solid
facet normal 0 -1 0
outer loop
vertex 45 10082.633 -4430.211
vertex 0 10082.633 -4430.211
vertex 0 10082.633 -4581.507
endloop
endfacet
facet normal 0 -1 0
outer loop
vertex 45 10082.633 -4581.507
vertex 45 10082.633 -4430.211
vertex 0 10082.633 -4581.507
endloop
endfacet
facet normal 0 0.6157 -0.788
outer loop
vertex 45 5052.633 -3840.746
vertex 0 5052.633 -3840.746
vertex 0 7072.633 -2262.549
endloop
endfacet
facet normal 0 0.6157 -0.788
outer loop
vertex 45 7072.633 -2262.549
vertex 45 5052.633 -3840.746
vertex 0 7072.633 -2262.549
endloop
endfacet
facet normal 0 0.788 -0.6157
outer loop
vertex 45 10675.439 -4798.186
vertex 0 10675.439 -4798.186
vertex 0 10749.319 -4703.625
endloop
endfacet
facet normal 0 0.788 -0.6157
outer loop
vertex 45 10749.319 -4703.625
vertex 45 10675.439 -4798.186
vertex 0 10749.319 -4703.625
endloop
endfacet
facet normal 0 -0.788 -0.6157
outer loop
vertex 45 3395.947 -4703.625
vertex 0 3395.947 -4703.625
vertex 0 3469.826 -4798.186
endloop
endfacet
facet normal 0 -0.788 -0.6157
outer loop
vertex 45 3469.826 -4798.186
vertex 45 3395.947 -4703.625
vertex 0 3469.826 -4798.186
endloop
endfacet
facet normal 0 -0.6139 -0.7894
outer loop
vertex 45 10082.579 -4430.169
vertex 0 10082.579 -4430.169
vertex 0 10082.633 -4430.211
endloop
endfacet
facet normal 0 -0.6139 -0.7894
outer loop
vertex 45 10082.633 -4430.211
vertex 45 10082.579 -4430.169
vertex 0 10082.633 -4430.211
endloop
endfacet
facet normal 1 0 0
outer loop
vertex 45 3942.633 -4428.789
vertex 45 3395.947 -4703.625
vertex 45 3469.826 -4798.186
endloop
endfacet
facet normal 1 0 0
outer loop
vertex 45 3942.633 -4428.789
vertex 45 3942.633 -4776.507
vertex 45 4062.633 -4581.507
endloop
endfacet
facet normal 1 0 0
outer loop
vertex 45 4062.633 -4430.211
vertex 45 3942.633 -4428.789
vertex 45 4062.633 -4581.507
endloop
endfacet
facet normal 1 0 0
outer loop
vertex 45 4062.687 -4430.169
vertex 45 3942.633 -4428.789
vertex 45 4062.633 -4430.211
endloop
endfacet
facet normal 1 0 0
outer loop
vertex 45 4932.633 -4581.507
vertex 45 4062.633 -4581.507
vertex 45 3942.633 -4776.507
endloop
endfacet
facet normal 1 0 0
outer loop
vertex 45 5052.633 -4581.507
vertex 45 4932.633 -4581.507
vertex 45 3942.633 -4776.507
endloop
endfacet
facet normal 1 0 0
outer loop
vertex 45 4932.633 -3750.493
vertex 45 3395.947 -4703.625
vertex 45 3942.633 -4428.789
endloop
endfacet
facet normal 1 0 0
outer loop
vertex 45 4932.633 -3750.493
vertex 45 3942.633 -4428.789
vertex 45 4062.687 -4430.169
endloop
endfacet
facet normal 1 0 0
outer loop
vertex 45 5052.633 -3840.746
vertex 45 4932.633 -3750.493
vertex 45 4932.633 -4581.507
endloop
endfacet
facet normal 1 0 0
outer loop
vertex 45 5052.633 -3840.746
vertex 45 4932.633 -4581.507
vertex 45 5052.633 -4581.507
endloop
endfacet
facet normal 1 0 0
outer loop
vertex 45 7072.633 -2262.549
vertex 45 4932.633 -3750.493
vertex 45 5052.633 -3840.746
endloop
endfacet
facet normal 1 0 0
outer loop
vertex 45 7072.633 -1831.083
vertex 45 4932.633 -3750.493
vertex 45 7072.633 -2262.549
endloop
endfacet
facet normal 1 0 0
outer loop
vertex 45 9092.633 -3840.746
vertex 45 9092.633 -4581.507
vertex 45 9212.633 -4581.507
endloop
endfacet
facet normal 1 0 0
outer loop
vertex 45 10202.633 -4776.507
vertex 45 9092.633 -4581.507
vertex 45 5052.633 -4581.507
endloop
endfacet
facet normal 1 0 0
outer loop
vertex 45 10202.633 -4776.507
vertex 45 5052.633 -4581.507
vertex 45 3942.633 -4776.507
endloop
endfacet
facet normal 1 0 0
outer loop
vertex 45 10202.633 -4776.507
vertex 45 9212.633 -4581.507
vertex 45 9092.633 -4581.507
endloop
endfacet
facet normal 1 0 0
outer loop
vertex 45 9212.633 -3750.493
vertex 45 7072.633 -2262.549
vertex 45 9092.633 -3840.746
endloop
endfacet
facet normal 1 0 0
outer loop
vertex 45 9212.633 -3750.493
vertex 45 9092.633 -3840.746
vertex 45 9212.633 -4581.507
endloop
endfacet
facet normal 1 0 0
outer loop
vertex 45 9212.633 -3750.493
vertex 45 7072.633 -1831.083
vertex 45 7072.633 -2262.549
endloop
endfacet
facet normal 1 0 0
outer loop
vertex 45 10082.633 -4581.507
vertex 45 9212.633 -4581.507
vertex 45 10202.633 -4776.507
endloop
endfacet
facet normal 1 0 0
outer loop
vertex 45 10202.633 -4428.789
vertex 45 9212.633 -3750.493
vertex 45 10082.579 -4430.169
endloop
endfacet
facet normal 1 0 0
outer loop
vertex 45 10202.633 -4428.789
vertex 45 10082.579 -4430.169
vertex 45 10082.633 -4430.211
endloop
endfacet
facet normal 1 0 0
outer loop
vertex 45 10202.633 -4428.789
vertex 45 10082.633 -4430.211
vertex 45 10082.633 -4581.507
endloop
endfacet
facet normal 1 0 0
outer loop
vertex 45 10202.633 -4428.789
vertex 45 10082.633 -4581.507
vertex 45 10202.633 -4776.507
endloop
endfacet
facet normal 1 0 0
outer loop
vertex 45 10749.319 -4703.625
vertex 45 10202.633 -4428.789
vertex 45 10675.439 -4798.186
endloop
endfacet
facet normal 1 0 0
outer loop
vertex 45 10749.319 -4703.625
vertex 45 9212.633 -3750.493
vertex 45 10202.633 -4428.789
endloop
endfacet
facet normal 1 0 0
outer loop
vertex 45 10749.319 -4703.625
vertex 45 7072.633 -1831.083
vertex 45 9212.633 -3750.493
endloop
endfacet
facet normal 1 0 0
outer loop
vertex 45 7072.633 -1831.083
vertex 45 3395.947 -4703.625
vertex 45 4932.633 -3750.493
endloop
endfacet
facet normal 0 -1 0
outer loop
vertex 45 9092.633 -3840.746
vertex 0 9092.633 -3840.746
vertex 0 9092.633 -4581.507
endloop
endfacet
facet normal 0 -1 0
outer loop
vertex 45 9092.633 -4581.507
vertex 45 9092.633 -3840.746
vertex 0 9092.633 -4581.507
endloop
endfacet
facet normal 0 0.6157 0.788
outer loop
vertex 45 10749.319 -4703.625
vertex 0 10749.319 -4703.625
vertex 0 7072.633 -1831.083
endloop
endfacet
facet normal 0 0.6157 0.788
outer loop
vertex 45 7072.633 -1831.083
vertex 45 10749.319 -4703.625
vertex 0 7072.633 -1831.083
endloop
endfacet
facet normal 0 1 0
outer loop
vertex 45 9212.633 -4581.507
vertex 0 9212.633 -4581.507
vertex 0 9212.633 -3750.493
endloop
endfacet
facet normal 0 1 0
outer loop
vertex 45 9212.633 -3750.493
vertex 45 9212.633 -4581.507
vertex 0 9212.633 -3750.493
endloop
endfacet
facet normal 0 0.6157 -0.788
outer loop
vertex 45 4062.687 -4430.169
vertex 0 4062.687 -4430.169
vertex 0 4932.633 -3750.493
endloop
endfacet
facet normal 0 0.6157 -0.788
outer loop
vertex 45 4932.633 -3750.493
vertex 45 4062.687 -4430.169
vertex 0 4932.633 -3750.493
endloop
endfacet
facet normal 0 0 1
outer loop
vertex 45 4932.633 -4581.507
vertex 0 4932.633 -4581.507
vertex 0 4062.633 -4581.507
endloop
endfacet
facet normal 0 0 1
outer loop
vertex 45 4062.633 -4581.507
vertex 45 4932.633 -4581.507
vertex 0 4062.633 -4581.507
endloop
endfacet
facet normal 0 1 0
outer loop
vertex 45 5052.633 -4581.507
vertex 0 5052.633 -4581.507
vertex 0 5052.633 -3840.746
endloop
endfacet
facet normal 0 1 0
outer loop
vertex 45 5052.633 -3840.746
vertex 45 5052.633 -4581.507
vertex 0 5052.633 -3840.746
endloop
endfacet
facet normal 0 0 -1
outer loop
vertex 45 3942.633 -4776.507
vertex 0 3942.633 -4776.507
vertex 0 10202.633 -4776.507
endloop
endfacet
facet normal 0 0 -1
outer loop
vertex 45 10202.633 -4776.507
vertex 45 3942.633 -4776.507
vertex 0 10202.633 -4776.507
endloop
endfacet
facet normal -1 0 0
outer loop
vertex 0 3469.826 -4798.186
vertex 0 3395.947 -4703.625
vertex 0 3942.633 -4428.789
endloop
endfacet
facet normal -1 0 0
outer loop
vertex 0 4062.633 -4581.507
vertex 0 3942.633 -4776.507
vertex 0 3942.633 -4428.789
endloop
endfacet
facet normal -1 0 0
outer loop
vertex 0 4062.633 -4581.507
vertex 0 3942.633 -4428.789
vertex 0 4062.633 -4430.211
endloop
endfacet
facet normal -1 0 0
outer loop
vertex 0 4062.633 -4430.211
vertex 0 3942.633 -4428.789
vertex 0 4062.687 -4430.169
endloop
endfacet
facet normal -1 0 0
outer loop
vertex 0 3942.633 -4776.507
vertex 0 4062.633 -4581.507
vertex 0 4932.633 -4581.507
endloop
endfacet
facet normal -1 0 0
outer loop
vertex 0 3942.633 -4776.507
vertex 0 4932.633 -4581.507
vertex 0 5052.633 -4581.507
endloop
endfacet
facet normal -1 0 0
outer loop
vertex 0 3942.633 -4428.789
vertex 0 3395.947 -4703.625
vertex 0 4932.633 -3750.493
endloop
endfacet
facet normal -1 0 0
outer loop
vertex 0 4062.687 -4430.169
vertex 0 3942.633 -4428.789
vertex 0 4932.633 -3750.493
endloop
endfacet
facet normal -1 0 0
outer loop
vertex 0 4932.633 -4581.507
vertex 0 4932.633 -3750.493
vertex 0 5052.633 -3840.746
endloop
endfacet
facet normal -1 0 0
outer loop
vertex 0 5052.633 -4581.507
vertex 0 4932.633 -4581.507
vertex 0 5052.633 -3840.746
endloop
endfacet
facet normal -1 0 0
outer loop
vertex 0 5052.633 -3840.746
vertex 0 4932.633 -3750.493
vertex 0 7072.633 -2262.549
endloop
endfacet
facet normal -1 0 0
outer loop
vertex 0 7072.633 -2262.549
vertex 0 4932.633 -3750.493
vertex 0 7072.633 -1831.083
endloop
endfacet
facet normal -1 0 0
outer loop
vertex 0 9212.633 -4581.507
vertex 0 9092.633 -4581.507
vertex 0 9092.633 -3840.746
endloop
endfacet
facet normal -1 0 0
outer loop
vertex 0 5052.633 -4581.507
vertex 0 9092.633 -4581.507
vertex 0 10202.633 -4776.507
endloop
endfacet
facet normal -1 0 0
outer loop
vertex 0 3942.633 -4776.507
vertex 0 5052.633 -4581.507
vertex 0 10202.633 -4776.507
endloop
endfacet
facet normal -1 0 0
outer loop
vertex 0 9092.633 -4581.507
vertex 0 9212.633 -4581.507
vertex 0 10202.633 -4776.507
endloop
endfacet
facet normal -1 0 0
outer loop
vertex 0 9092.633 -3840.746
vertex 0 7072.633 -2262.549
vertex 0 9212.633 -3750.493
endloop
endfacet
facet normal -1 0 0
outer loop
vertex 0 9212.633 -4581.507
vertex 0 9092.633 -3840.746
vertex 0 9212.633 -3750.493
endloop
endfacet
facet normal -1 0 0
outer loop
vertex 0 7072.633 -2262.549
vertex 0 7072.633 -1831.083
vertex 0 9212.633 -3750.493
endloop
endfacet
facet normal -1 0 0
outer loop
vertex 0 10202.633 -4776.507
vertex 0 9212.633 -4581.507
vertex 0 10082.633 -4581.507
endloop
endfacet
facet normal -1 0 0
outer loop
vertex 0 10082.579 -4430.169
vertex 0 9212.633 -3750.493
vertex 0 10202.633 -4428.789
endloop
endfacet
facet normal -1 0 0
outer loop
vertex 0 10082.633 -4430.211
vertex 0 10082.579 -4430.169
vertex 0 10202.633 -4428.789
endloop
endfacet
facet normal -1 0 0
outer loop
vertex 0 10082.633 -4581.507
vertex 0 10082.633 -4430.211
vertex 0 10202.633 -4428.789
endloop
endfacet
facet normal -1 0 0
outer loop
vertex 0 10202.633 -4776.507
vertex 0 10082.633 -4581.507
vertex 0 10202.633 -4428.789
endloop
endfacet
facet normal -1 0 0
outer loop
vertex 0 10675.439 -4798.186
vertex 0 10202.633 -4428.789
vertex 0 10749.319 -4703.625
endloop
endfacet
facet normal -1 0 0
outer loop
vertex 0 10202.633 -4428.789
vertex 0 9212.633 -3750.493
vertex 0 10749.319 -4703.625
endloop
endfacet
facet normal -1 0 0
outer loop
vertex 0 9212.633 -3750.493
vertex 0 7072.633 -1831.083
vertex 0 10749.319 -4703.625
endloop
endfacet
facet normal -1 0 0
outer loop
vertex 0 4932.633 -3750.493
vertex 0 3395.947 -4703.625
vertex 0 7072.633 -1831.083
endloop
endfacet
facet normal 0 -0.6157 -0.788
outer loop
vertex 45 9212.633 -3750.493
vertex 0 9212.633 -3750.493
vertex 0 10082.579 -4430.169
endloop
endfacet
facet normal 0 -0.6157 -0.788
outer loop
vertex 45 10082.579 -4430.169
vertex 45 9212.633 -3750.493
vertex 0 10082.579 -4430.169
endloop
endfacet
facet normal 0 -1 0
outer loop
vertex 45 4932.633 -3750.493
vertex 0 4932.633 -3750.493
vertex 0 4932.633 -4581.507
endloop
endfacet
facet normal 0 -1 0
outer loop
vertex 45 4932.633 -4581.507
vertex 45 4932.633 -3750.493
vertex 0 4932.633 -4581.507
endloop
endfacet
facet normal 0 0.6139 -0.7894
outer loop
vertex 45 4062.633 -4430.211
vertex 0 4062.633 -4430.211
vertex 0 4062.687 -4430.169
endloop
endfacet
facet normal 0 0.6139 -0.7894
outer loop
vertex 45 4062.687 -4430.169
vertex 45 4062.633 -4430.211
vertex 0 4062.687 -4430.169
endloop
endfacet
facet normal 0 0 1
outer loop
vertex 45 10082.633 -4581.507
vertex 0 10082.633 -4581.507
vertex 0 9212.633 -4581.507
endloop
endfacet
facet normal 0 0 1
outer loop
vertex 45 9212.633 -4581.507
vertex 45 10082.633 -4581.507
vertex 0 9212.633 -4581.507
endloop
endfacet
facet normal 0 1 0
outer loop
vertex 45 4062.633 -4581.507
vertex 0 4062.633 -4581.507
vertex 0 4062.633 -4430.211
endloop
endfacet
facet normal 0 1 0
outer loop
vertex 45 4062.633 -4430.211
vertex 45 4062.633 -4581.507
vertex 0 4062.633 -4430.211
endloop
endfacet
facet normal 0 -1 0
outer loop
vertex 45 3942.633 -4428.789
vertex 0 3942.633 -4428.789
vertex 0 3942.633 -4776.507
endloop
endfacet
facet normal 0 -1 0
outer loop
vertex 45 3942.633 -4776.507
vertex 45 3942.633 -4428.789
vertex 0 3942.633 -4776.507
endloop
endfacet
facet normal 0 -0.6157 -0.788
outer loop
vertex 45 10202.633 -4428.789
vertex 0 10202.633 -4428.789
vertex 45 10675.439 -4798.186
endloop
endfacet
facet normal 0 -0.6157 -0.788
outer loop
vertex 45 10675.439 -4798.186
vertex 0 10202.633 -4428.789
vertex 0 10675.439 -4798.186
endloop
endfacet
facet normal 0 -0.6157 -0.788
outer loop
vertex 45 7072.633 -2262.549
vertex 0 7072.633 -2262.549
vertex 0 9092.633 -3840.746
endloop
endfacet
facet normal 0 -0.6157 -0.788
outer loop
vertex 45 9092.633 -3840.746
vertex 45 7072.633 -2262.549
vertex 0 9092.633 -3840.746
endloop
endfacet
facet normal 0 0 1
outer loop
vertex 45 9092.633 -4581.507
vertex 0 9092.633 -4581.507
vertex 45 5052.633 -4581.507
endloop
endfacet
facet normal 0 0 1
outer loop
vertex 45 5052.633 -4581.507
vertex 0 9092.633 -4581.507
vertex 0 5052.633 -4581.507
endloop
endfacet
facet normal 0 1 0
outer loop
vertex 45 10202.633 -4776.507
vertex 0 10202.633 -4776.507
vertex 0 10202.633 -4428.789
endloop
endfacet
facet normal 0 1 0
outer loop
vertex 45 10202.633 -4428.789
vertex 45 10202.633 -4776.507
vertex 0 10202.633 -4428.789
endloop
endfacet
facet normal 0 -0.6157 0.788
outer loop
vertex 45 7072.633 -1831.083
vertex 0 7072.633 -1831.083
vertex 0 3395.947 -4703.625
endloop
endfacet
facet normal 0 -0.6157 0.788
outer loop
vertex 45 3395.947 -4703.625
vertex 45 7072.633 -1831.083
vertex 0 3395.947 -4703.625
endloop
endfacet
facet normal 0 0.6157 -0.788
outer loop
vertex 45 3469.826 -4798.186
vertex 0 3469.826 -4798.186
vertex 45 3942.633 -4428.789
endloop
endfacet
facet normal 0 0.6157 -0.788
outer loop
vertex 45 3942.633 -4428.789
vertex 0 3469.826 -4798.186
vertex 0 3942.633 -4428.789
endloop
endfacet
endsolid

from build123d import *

# Parameters (mm, degrees)
F1_DEPTH = 45


with BuildPart() as f1:
    # F0 (on Right) → F1 (new body)
    with BuildSketch(Plane.YZ):
        Polygon((7072.6329036231, -1831.0830527794), (7072.6329036231, -2078.5416047186), (9092.6329036231, -3656.7385702622), (9212.6329036231, -3750.492845443), (10080.8127102119, -4428.7892495542), (10202.6329036231, -4428.7892495542), (10675.4393557871, -4798.1861347496), (10749.3187328262, -4703.6248443168), (10202.6329036231, -4276.5070637455), align=None)
        Polygon((7072.6329036231, -2078.5416047186), (7072.6329036231, -2262.5492459041), (9092.6329036231, -3840.7462114477), (9092.6329036231, -3656.7385702622), align=None)
        Polygon((3469.826451459, -4798.1861347496), (3942.6329036231, -4428.7892495542), (4064.4530970343, -4428.7892495542), (4932.6329036231, -3750.492845443), (5052.6329036231, -3656.7385702622), (7072.6329036231, -2078.5416047186), (7072.6329036231, -1831.0830527794), (3942.6329036231, -4276.5070637455), (3395.9470744199, -4703.6248443168), align=None)
        Polygon((5052.6329036231, -3840.7462114477), (7072.6329036231, -2262.5492459041), (7072.6329036231, -2078.5416047186), (5052.6329036231, -3656.7385702622), align=None)
        Polygon((4932.6329036231, -4581.5070637455), (5052.6329036231, -4581.5070637455), (5052.6329036231, -3840.7462114477), (5052.6329036231, -3656.7385702622), (4932.6329036231, -3750.492845443), align=None)
        Polygon((3942.6329036231, -4428.7892495542), (3942.6329036231, -4581.5070637455), (4062.6329036231, -4581.5070637455), (4062.6329036231, -4430.2113405038), (4062.6868913116, -4430.1691606988), (4064.4530970343, -4428.7892495542), align=None)
        Polygon((3942.6329036231, -4581.5070637455), (3942.6329036231, -4776.5070637455), (7072.6329036231, -4776.5070637455), (7072.6329036231, -4581.5070637455), (5052.6329036231, -4581.5070637455), (4932.6329036231, -4581.5070637455), (4062.6329036231, -4581.5070637455), align=None)
        Polygon((7072.6329036231, -4581.5070637455), (7072.6329036231, -4776.5070637455), (10202.6329036231, -4776.5070637455), (10202.6329036231, -4581.5070637455), (10082.6329036231, -4581.5070637455), (9212.6329036231, -4581.5070637455), (9092.6329036231, -4581.5070637455), align=None)
        Polygon((9092.6329036231, -3840.7462114477), (9092.6329036231, -4581.5070637455), (9212.6329036231, -4581.5070637455), (9212.6329036231, -3750.492845443), (9092.6329036231, -3656.7385702622), align=None)
        Polygon((10082.6329036231, -4581.5070637455), (10202.6329036231, -4581.5070637455), (10202.6329036231, -4428.7892495542), (10080.8127102119, -4428.7892495542), (10082.5789159346, -4430.1691606988), (10082.6329036231, -4430.2113405038), align=None)
    extrude(amount=F1_DEPTH)


solid = f1.part
